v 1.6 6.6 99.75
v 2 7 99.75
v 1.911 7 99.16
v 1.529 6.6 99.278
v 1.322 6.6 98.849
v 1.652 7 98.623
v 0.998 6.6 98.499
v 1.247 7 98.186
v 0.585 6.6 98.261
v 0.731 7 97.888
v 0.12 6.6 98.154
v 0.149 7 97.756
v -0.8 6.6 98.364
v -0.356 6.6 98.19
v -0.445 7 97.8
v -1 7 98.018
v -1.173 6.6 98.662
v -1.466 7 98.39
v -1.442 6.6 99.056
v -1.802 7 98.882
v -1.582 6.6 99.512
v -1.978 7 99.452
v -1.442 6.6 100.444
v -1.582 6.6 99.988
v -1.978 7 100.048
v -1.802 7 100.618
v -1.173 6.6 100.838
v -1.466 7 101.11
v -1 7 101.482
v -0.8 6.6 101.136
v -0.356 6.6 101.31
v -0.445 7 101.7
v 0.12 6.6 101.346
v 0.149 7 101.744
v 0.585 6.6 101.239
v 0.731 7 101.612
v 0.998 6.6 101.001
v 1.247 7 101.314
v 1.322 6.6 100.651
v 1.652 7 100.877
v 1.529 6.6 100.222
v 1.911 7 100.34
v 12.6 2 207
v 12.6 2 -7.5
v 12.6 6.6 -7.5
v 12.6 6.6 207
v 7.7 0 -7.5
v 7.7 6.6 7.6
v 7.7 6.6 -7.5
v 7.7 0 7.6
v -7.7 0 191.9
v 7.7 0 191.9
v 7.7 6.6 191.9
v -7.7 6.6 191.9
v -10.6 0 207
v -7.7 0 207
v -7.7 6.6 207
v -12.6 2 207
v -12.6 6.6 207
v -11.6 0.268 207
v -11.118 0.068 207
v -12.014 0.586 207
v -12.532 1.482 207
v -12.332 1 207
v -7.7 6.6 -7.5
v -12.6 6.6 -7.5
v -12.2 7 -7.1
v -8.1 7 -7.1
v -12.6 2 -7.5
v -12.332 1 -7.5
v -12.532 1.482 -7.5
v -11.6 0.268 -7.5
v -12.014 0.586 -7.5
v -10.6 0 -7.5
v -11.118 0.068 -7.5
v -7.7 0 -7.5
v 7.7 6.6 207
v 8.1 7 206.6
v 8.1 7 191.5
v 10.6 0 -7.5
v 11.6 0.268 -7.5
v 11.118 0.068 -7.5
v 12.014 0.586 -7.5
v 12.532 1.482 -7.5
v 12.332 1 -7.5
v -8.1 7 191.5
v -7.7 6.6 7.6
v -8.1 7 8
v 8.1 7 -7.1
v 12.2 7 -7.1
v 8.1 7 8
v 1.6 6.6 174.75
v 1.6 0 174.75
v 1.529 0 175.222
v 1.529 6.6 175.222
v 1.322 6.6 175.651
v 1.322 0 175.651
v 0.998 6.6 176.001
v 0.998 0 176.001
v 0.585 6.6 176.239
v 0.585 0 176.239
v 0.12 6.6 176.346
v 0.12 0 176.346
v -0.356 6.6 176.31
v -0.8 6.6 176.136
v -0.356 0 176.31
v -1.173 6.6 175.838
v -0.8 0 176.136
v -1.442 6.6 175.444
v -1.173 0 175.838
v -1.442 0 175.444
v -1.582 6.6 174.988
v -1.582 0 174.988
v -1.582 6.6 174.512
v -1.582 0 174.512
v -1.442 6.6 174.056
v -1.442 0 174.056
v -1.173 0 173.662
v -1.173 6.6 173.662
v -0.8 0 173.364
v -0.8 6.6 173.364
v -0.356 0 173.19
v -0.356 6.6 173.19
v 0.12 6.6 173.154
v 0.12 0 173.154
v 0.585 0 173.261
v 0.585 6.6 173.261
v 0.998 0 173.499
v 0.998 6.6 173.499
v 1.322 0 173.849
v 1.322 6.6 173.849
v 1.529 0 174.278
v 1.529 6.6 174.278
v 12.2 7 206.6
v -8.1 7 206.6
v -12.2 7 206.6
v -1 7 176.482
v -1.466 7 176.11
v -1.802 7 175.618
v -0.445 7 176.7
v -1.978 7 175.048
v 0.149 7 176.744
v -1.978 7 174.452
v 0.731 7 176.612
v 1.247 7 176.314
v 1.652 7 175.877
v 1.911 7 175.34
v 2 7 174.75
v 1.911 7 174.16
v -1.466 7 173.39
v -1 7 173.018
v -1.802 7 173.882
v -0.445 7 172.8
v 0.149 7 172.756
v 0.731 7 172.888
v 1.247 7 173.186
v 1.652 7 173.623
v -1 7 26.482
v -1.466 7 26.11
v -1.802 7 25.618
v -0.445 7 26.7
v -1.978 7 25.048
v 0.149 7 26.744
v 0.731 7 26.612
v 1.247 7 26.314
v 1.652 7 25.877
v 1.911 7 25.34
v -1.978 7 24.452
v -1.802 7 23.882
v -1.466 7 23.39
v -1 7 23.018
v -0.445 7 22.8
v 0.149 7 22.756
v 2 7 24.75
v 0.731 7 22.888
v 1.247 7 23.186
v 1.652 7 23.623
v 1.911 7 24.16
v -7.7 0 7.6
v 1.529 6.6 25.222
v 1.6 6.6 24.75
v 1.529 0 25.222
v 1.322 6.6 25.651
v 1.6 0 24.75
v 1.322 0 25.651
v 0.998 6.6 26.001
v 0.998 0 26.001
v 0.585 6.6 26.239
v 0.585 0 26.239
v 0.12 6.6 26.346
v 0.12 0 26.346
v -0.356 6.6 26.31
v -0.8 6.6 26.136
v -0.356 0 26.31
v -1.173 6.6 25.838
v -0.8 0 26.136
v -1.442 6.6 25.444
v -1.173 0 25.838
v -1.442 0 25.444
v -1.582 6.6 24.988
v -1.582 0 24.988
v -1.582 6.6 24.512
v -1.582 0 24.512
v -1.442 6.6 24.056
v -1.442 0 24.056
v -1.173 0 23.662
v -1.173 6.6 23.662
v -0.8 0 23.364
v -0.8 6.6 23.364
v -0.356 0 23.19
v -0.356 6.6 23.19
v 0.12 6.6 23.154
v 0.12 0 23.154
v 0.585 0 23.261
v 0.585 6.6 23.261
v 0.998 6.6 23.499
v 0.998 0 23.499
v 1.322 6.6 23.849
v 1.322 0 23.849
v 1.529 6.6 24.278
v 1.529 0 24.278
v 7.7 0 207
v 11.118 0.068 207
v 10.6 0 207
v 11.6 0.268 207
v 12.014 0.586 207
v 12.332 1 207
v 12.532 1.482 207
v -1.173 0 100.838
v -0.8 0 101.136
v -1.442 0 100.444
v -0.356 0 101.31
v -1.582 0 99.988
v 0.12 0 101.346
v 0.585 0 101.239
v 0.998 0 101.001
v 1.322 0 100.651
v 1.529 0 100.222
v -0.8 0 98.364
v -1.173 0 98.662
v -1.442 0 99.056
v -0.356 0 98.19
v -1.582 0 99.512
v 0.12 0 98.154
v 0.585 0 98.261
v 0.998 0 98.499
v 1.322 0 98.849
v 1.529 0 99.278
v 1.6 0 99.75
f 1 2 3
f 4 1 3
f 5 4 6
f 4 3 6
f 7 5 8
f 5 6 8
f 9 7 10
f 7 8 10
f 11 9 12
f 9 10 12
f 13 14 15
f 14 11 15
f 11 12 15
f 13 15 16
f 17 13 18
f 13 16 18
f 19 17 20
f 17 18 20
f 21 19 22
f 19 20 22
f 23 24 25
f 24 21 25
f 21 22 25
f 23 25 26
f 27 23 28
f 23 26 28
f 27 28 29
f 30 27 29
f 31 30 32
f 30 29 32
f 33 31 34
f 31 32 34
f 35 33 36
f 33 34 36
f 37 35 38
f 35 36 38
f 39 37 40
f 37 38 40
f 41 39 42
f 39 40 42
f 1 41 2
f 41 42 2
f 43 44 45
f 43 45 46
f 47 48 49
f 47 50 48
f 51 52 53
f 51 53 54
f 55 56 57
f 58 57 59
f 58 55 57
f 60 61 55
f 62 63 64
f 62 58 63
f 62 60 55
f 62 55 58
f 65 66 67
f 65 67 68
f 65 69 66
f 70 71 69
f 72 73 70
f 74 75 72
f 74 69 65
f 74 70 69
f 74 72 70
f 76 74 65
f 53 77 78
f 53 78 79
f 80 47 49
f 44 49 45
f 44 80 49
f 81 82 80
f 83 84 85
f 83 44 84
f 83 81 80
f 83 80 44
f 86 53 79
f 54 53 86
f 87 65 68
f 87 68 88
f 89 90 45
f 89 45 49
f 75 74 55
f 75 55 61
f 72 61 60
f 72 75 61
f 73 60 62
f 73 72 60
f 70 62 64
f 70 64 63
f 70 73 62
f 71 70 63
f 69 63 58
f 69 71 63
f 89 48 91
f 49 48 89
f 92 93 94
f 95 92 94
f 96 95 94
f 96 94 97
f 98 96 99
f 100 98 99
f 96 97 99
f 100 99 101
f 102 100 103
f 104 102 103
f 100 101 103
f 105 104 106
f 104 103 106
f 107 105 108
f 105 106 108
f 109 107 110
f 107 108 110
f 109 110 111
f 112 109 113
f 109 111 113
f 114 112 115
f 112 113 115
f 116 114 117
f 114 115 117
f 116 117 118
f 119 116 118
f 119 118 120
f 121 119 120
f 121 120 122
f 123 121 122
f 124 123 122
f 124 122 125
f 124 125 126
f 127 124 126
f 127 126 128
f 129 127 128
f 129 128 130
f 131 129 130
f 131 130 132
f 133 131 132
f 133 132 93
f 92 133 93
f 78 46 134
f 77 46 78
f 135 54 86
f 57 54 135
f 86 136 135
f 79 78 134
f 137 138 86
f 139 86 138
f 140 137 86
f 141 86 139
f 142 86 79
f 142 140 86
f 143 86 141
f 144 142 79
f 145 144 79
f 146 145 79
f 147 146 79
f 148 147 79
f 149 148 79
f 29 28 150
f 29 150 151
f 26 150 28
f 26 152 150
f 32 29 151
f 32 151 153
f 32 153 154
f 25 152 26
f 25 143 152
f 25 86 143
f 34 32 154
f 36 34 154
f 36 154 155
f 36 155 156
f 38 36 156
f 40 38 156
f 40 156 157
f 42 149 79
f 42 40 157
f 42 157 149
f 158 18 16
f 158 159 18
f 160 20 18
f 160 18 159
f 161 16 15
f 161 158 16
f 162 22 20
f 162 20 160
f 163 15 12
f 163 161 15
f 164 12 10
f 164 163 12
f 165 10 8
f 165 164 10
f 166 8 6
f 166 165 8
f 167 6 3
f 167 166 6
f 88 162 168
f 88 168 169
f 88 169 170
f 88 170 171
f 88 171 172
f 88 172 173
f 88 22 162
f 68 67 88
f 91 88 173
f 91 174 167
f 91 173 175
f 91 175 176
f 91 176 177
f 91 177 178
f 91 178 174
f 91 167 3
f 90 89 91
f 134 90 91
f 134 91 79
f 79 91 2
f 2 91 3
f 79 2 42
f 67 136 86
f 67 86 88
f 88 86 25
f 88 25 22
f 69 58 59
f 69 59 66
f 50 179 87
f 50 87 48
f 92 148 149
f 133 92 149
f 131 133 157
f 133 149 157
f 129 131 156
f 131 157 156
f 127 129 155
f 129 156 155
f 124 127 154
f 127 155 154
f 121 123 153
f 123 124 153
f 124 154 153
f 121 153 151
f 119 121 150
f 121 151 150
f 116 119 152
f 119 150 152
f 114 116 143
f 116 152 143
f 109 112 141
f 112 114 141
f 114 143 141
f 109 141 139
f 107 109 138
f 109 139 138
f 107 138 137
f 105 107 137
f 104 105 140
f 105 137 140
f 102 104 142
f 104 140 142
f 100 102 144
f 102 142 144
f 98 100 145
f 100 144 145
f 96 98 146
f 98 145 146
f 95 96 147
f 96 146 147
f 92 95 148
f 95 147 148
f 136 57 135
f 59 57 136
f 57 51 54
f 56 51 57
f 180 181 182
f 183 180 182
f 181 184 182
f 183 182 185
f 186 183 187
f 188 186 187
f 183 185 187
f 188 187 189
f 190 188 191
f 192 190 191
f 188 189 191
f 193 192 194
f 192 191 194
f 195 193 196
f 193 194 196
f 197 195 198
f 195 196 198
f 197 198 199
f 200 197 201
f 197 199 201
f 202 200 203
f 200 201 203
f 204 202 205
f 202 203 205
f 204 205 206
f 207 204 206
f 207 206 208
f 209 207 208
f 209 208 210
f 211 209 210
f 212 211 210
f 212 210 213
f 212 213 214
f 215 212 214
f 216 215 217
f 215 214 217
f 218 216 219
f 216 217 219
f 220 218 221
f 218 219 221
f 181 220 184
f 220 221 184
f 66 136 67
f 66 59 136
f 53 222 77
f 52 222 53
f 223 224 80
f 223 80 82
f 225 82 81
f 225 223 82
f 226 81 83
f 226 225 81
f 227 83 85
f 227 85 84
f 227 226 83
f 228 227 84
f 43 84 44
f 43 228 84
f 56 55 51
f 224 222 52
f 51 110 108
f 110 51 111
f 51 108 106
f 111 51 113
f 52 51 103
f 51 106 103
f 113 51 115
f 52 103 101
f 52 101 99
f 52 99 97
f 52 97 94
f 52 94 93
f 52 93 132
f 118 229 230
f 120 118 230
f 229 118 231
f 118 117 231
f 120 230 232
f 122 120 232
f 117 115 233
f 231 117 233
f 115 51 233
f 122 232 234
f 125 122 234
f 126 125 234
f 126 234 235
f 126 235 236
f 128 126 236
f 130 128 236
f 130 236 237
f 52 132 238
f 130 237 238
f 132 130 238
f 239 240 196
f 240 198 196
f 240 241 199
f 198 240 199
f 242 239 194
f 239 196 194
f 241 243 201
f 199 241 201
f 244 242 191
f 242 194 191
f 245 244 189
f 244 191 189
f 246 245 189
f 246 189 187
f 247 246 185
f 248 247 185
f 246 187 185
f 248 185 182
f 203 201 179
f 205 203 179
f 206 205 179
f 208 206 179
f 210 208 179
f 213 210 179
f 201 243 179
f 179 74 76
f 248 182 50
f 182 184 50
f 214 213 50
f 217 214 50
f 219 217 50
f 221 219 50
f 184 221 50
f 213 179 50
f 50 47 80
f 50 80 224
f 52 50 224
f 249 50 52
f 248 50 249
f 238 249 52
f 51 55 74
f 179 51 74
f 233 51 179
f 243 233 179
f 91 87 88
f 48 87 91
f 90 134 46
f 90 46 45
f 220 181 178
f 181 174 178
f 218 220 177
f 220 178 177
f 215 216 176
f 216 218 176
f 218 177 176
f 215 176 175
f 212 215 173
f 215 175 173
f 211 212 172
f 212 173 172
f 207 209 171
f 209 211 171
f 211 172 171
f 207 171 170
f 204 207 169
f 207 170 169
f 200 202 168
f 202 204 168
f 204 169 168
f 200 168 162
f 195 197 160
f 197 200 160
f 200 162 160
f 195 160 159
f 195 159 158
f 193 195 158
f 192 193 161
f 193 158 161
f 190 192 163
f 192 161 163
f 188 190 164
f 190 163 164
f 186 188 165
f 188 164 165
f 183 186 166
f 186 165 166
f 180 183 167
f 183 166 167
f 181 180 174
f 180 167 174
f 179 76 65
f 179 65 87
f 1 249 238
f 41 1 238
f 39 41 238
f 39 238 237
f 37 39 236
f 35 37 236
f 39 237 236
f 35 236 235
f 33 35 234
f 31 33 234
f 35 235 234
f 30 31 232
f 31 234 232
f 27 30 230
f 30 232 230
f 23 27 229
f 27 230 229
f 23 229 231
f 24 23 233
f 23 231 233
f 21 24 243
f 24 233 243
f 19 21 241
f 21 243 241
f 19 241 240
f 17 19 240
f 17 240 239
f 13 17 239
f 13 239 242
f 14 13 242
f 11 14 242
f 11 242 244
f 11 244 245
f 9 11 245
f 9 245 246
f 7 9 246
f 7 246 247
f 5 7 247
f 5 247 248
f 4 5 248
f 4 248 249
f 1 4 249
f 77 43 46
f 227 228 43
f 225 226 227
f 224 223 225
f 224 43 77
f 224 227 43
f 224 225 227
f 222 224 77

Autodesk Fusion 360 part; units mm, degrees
sketch "Sketch1" plane through (0, 0, 0) normal (0, 1, 0) x (1, 0, 0)
  line L0 (7.6, 7.5) -> (-7.6, 7.5)
  line L1 (-7.6, 7.5) -> (-7.6, -7.5)
  line L2 (-7.6, -7.5) -> (7.6, -7.5)
  line L3 (7.6, -7.5) -> (7.6, 7.5)
  line L4 (7.6, 7.5) -> (-7.6, -7.5) construction
  line L5 (-7.6, 7.5) -> (7.6, -7.5) construction
  line L6 (7.6, -192) -> (-7.6, -192)
  line L7 (-7.6, -192) -> (-7.6, -207)
  line L8 (-7.6, -207) -> (7.6, -207)
  line L9 (7.6, -207) -> (7.6, -192)
  line L10 (7.6, -192) -> (-7.6, -207) construction
  line L11 (-7.6, -192) -> (7.6, -207) construction
  circle A0 centre (0, -174.75) radius 1.6
  circle A1 centre (0, -99.75) radius 1.6
  circle A2 centre (0, -24.75) radius 1.6
  line L12 (12.6, -207) -> (-12.6, -207)
  line L13 (-12.6, -207) -> (-12.6, 7.5)
  line L14 (-12.6, 7.5) -> (12.6, 7.5)
  line L15 (12.6, 7.5) -> (12.6, -207)
  line L16 (12.6, -207) -> (-12.6, 7.5) construction
  line L17 (-12.6, -207) -> (12.6, 7.5) construction
  point P0 (0, -199.5)
  point P1 (0, -99.75)
  dimension "d1" = 15.2
  dimension "d2" = 15
  dimension "d3" = 15.2
  dimension "d4" = 15
  dimension "d5" = 184.5
  dimension "d6" = 3.2
  dimension "d12" = 0
  dimension "d13" = 150
  dimension "d14" = 25.2
  dimension "d20" = 207
extrude "Extrude1" add sketch "Sketch1" along normal blind 7 contours L1 L2 L3 L6 L7 L9 L12 L13 L14 L15
fillet "Fillet1" radius 2 2 edges at (-12.6, 0, 99.75) (12.6, 0, 99.75)
move_face "OffsetFaces1" offset -0.1 3 faces at (-7.6, 2.3333, 197) (7.6, 2.3333, 202) (2.5333, 2.3333, 192)
move_face "OffsetFaces2" offset -0.1 3 faces at (-2.5333, 2.3333, 7.5) (-7.6, 2.3333, -2.5) (7.6, 2.3333, 2.5)
chamfer "Chamfer1" distance 0.4 angle 45 1 faces at (0, 7, 12.7833)
equation "d14 = 15.2 mm + 10 mm"
